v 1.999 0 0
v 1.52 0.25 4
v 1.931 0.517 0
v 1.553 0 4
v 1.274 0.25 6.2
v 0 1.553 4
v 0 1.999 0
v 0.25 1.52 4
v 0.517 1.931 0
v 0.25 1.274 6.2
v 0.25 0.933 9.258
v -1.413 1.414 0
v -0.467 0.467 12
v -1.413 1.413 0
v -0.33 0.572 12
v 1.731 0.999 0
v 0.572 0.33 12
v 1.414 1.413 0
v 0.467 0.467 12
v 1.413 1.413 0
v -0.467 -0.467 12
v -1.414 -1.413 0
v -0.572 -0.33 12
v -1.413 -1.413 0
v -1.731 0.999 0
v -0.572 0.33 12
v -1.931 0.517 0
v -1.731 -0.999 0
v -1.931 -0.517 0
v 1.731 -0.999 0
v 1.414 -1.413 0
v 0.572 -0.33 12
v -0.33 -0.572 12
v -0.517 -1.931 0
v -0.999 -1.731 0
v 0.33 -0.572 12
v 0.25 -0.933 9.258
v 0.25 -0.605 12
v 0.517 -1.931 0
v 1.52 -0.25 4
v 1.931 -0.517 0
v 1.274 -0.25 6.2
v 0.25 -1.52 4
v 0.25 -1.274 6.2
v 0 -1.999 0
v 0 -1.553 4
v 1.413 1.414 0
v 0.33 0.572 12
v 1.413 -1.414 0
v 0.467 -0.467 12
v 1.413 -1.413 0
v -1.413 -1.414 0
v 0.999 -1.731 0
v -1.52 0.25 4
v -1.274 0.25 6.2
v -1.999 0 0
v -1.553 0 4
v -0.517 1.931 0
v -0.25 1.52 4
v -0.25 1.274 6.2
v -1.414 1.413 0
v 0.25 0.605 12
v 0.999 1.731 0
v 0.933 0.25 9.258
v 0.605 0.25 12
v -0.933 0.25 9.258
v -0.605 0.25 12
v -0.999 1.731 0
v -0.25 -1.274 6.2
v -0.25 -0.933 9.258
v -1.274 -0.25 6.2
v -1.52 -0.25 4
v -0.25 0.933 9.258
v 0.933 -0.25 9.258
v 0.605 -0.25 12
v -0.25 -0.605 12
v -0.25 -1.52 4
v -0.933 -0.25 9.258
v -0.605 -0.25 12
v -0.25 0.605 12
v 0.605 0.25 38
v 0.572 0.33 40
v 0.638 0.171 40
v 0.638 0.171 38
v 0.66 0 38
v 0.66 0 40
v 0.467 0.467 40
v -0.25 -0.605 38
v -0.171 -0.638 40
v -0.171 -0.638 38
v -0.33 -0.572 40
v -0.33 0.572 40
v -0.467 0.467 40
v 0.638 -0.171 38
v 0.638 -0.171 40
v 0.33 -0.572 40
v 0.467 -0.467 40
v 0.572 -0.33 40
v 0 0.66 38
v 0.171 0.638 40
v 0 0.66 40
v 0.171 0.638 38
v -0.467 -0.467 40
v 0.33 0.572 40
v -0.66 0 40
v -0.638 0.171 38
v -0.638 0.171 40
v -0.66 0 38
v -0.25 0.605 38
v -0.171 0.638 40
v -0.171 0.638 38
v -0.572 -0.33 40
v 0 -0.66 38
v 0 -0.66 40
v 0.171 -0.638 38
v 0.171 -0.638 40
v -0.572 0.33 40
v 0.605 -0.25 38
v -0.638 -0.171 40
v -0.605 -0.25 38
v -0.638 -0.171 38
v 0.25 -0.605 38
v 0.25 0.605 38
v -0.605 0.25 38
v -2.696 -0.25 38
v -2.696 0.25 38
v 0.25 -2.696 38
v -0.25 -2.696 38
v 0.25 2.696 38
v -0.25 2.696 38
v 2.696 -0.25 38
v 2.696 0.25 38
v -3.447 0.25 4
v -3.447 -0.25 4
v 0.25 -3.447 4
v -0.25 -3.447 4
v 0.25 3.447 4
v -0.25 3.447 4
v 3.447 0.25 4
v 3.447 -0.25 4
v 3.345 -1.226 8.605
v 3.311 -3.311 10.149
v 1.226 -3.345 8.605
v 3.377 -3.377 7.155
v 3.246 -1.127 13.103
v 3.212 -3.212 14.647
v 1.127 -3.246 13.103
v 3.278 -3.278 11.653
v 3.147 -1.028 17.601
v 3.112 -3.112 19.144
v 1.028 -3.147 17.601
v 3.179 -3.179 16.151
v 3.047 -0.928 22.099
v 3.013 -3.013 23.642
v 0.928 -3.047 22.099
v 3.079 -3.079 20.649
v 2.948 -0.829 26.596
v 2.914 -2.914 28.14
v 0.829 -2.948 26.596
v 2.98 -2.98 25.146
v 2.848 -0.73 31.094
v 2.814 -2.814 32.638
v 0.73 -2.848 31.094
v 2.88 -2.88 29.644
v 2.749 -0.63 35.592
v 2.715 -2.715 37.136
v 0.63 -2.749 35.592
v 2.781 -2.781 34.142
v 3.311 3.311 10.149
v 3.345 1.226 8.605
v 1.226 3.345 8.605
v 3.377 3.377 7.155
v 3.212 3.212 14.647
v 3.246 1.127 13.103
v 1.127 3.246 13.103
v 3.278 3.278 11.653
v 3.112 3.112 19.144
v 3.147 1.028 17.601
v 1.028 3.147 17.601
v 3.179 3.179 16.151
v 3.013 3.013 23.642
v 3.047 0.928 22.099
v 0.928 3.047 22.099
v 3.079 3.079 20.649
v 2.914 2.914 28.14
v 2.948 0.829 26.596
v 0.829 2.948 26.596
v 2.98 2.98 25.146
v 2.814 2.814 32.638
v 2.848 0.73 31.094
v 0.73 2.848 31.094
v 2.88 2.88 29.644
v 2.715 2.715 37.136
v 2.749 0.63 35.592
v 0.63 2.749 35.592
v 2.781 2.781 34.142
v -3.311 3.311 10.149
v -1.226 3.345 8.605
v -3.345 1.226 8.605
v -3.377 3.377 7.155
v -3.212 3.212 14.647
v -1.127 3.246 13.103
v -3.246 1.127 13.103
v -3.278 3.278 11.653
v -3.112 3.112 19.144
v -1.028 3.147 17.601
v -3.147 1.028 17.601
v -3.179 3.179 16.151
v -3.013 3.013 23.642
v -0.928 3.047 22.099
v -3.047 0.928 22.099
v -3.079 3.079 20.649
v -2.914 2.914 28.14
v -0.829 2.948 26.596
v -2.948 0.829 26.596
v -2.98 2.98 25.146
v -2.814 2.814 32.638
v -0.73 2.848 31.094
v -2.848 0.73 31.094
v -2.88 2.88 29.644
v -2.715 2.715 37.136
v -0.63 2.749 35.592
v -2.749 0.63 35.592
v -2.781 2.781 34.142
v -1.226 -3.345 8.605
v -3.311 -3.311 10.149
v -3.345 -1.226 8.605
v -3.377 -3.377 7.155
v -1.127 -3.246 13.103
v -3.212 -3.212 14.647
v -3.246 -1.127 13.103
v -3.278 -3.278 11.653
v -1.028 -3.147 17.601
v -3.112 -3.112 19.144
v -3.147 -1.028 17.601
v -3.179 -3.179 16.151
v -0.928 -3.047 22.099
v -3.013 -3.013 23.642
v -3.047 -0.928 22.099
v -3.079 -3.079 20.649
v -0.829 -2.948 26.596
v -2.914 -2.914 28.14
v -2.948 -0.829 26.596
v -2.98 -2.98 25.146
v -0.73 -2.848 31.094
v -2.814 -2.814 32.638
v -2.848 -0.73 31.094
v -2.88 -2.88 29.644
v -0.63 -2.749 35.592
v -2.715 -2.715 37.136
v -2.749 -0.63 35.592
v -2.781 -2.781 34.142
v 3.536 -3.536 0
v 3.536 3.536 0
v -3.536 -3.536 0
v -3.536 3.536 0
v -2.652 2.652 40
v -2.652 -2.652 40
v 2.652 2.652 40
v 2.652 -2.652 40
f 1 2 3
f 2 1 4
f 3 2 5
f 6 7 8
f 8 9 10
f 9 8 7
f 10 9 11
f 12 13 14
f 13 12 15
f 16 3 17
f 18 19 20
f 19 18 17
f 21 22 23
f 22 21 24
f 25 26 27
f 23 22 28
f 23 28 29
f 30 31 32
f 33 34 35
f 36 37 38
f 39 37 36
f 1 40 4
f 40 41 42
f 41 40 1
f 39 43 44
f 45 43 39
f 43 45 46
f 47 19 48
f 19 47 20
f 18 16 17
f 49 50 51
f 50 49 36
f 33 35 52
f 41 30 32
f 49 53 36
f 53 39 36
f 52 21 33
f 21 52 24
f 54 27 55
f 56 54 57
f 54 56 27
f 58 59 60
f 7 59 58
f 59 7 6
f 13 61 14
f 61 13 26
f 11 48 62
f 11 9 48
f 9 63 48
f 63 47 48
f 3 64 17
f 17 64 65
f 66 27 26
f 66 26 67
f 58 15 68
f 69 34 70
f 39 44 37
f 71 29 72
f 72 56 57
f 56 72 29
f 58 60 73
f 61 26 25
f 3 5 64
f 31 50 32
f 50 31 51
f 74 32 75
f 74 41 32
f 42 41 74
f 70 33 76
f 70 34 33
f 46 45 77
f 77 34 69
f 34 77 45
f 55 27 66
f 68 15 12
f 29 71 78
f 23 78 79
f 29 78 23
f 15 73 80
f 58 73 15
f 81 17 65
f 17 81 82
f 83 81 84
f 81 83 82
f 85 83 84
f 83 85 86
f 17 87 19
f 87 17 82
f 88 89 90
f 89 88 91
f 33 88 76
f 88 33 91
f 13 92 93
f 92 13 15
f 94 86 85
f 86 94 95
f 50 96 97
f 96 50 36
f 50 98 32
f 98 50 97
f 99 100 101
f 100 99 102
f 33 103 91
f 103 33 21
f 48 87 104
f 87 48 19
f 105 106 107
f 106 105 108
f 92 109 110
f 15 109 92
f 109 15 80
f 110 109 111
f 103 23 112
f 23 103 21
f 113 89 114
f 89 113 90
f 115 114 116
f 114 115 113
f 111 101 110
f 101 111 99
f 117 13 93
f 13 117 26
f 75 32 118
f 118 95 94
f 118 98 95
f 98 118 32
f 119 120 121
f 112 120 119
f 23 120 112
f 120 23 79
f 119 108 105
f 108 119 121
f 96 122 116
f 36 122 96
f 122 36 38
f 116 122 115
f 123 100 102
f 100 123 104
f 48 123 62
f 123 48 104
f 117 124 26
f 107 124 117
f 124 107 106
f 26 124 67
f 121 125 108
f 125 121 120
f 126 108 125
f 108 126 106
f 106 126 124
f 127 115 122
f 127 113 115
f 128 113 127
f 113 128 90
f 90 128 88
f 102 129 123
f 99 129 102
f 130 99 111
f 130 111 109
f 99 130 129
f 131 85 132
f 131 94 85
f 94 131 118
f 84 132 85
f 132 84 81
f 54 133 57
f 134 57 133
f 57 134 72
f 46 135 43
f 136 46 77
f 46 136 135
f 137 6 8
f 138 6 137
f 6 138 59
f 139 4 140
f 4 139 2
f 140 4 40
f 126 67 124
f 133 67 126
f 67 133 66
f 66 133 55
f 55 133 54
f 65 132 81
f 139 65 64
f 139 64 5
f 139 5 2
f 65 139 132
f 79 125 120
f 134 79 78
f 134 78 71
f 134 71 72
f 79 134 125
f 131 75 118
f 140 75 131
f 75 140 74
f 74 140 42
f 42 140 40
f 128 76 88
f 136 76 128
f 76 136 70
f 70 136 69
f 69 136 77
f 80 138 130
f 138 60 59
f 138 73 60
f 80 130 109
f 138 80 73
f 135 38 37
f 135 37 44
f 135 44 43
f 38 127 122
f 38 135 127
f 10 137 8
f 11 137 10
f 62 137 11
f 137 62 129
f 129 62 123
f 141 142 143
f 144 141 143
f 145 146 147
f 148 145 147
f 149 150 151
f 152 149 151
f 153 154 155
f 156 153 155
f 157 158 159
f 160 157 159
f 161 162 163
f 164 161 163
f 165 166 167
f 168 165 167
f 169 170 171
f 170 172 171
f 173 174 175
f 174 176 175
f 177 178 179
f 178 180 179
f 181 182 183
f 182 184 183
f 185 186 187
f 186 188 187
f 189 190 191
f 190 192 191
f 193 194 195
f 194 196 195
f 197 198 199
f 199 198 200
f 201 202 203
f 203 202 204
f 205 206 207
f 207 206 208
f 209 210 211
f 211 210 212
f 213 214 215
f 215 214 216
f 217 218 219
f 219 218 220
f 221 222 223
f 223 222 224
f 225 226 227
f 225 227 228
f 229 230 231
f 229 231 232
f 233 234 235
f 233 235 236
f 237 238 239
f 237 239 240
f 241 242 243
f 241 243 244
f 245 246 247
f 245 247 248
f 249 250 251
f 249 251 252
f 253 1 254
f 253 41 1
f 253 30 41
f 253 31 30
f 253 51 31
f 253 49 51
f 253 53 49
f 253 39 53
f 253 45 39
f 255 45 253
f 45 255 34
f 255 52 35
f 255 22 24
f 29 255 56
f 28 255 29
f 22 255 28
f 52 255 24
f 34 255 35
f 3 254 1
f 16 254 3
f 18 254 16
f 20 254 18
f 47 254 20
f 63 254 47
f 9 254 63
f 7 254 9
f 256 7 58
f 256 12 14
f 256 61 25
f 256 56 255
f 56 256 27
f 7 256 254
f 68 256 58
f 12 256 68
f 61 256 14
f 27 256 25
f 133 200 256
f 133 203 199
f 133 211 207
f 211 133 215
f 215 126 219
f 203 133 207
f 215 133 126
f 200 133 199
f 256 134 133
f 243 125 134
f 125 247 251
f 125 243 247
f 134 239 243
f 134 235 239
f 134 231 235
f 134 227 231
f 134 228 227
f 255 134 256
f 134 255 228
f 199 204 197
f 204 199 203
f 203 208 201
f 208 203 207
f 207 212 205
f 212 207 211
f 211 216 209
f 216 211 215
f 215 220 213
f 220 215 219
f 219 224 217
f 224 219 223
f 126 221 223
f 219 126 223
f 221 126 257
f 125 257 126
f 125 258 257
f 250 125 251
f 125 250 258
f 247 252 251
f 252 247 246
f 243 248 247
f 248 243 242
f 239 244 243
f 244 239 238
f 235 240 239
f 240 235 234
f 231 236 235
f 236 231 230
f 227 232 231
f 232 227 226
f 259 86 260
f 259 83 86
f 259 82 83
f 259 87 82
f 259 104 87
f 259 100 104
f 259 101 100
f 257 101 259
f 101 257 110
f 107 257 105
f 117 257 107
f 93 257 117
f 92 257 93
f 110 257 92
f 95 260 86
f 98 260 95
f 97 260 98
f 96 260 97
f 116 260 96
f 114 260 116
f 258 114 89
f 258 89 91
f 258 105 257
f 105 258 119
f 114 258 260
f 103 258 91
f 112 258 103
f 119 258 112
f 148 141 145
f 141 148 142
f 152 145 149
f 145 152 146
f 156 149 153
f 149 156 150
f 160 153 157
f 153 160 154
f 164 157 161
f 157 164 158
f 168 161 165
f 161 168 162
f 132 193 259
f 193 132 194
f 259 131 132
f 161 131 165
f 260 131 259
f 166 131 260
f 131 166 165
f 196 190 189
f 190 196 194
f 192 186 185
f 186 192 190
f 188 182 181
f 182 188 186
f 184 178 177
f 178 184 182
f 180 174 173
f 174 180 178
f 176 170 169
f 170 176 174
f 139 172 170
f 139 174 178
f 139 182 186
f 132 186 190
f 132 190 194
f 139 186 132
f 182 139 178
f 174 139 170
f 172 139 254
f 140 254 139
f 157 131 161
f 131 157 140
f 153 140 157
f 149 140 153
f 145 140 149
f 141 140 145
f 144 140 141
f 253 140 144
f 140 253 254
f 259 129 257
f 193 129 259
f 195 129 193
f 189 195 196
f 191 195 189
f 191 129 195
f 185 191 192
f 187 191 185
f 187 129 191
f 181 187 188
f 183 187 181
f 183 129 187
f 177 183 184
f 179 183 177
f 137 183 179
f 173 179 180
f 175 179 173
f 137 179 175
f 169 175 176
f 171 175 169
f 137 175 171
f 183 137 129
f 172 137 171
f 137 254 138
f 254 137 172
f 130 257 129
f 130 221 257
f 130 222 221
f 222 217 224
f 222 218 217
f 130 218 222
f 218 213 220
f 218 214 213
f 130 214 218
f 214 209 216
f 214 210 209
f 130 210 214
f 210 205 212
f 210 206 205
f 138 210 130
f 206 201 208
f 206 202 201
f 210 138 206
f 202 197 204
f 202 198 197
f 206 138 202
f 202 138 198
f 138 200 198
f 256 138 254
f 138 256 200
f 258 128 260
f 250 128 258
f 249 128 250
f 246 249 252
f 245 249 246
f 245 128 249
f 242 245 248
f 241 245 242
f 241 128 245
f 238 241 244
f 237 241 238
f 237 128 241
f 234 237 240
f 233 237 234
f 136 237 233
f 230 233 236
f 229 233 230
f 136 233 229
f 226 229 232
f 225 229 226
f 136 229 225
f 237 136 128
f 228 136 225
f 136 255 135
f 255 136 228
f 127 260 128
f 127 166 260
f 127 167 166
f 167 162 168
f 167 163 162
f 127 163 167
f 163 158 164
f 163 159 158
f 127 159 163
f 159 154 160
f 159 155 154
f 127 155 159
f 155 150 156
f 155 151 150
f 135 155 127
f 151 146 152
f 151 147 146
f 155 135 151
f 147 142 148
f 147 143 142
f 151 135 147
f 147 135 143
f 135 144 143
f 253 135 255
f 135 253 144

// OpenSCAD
// a special wall anchor with lots of adjustments
// (all sizes in millimeter)

module wall_anchor (
    drill_hole_dm,          // drill hole diameter
    screw_dm,               // screw diameter
    length,                 // anchor length
    oversize        = 2,    // outer diameter oversize
    outer_taper     = 0.75, // outer taper factor
    inner_taper     = 0.2,  // inner taper factor
    inner_taper_end = 0.3,  // relative end of inner taper along length
    collar          = 0.1,  // relative length of initial non-slit part
    slit            = 0.5,  // slit width
    cap_size        = 2,    // length of the end cap
    teeth_div       = 5,    // divisor determining the number of teeth
    teeth_depth     = 1.5,  // depth of the teeth
    round_shape     = false // make the anchor round instead of square
){

	difference() {

        outer_dm = drill_hole_dm + oversize;
	    side_length   = 
            round_shape ? outer_dm : sqrt( pow(outer_dm, 2) / 2 );

	    linear_extrude( height = length, scale = outer_taper )
	    if ( round_shape )
	    	circle( d = side_length, $fn=36 );
	    else
	    	square( side_length, center = true );

	    // hole
	    abs_taper_end = length * inner_taper_end;
	    taper_dm      = screw_dm * inner_taper;

	    translate( [0, 0, -0.01] )
	    union() {
	        $fn = 24;
            
	        cylinder( d1 = screw_dm, d2 = taper_dm, h = abs_taper_end + 0.01);
	        
	        translate( [0, 0, abs_taper_end] )
	        cylinder( d = taper_dm, h = length - abs_taper_end + 0.02 );
	    }


        // slits
        abs_collar = length * collar;
        
        for (i = [0:1])
        rotate( [0, 0, i * 90] )
        translate([
        	-(side_length + 2) / 2, 
        	-slit / 2, 
        	abs_collar
        ]) 
        cube ([
        	side_length + 2, 
        	slit, 
        	length - cap_size - abs_collar
        ]);
        
        // teeth
        teeth_count = floor( (length - abs_collar) / teeth_div );
        teeth_dist  = (length - abs_collar) / (teeth_count + 1);
        
        opposite = (outer_dm - (outer_dm * outer_taper)) / 2;
        hypotenuse  = sqrt( pow(opposite, 2) + pow(length, 2) );
        angle = asin( opposite / hypotenuse );
        
        diag_dist = sqrt( pow(outer_dm/2 - teeth_depth, 2) / 2 );
                
        for ( j = [0:90:359] )
        rotate( [0, 0, j] )
        rotate( -angle, [1,1,0] )
        for (i = [1:teeth_count] )
        translate( [diag_dist, -diag_dist, abs_collar + i * teeth_dist] )
        rotate([0,0,-45])
        translate( [0, -outer_dm / 2, 0] )
        rotate([0,45,0])
        cube( outer_dm );        
	    
	}

}

wall_anchor(8,4,40, inner_taper = 0.33, round_shape = false);
